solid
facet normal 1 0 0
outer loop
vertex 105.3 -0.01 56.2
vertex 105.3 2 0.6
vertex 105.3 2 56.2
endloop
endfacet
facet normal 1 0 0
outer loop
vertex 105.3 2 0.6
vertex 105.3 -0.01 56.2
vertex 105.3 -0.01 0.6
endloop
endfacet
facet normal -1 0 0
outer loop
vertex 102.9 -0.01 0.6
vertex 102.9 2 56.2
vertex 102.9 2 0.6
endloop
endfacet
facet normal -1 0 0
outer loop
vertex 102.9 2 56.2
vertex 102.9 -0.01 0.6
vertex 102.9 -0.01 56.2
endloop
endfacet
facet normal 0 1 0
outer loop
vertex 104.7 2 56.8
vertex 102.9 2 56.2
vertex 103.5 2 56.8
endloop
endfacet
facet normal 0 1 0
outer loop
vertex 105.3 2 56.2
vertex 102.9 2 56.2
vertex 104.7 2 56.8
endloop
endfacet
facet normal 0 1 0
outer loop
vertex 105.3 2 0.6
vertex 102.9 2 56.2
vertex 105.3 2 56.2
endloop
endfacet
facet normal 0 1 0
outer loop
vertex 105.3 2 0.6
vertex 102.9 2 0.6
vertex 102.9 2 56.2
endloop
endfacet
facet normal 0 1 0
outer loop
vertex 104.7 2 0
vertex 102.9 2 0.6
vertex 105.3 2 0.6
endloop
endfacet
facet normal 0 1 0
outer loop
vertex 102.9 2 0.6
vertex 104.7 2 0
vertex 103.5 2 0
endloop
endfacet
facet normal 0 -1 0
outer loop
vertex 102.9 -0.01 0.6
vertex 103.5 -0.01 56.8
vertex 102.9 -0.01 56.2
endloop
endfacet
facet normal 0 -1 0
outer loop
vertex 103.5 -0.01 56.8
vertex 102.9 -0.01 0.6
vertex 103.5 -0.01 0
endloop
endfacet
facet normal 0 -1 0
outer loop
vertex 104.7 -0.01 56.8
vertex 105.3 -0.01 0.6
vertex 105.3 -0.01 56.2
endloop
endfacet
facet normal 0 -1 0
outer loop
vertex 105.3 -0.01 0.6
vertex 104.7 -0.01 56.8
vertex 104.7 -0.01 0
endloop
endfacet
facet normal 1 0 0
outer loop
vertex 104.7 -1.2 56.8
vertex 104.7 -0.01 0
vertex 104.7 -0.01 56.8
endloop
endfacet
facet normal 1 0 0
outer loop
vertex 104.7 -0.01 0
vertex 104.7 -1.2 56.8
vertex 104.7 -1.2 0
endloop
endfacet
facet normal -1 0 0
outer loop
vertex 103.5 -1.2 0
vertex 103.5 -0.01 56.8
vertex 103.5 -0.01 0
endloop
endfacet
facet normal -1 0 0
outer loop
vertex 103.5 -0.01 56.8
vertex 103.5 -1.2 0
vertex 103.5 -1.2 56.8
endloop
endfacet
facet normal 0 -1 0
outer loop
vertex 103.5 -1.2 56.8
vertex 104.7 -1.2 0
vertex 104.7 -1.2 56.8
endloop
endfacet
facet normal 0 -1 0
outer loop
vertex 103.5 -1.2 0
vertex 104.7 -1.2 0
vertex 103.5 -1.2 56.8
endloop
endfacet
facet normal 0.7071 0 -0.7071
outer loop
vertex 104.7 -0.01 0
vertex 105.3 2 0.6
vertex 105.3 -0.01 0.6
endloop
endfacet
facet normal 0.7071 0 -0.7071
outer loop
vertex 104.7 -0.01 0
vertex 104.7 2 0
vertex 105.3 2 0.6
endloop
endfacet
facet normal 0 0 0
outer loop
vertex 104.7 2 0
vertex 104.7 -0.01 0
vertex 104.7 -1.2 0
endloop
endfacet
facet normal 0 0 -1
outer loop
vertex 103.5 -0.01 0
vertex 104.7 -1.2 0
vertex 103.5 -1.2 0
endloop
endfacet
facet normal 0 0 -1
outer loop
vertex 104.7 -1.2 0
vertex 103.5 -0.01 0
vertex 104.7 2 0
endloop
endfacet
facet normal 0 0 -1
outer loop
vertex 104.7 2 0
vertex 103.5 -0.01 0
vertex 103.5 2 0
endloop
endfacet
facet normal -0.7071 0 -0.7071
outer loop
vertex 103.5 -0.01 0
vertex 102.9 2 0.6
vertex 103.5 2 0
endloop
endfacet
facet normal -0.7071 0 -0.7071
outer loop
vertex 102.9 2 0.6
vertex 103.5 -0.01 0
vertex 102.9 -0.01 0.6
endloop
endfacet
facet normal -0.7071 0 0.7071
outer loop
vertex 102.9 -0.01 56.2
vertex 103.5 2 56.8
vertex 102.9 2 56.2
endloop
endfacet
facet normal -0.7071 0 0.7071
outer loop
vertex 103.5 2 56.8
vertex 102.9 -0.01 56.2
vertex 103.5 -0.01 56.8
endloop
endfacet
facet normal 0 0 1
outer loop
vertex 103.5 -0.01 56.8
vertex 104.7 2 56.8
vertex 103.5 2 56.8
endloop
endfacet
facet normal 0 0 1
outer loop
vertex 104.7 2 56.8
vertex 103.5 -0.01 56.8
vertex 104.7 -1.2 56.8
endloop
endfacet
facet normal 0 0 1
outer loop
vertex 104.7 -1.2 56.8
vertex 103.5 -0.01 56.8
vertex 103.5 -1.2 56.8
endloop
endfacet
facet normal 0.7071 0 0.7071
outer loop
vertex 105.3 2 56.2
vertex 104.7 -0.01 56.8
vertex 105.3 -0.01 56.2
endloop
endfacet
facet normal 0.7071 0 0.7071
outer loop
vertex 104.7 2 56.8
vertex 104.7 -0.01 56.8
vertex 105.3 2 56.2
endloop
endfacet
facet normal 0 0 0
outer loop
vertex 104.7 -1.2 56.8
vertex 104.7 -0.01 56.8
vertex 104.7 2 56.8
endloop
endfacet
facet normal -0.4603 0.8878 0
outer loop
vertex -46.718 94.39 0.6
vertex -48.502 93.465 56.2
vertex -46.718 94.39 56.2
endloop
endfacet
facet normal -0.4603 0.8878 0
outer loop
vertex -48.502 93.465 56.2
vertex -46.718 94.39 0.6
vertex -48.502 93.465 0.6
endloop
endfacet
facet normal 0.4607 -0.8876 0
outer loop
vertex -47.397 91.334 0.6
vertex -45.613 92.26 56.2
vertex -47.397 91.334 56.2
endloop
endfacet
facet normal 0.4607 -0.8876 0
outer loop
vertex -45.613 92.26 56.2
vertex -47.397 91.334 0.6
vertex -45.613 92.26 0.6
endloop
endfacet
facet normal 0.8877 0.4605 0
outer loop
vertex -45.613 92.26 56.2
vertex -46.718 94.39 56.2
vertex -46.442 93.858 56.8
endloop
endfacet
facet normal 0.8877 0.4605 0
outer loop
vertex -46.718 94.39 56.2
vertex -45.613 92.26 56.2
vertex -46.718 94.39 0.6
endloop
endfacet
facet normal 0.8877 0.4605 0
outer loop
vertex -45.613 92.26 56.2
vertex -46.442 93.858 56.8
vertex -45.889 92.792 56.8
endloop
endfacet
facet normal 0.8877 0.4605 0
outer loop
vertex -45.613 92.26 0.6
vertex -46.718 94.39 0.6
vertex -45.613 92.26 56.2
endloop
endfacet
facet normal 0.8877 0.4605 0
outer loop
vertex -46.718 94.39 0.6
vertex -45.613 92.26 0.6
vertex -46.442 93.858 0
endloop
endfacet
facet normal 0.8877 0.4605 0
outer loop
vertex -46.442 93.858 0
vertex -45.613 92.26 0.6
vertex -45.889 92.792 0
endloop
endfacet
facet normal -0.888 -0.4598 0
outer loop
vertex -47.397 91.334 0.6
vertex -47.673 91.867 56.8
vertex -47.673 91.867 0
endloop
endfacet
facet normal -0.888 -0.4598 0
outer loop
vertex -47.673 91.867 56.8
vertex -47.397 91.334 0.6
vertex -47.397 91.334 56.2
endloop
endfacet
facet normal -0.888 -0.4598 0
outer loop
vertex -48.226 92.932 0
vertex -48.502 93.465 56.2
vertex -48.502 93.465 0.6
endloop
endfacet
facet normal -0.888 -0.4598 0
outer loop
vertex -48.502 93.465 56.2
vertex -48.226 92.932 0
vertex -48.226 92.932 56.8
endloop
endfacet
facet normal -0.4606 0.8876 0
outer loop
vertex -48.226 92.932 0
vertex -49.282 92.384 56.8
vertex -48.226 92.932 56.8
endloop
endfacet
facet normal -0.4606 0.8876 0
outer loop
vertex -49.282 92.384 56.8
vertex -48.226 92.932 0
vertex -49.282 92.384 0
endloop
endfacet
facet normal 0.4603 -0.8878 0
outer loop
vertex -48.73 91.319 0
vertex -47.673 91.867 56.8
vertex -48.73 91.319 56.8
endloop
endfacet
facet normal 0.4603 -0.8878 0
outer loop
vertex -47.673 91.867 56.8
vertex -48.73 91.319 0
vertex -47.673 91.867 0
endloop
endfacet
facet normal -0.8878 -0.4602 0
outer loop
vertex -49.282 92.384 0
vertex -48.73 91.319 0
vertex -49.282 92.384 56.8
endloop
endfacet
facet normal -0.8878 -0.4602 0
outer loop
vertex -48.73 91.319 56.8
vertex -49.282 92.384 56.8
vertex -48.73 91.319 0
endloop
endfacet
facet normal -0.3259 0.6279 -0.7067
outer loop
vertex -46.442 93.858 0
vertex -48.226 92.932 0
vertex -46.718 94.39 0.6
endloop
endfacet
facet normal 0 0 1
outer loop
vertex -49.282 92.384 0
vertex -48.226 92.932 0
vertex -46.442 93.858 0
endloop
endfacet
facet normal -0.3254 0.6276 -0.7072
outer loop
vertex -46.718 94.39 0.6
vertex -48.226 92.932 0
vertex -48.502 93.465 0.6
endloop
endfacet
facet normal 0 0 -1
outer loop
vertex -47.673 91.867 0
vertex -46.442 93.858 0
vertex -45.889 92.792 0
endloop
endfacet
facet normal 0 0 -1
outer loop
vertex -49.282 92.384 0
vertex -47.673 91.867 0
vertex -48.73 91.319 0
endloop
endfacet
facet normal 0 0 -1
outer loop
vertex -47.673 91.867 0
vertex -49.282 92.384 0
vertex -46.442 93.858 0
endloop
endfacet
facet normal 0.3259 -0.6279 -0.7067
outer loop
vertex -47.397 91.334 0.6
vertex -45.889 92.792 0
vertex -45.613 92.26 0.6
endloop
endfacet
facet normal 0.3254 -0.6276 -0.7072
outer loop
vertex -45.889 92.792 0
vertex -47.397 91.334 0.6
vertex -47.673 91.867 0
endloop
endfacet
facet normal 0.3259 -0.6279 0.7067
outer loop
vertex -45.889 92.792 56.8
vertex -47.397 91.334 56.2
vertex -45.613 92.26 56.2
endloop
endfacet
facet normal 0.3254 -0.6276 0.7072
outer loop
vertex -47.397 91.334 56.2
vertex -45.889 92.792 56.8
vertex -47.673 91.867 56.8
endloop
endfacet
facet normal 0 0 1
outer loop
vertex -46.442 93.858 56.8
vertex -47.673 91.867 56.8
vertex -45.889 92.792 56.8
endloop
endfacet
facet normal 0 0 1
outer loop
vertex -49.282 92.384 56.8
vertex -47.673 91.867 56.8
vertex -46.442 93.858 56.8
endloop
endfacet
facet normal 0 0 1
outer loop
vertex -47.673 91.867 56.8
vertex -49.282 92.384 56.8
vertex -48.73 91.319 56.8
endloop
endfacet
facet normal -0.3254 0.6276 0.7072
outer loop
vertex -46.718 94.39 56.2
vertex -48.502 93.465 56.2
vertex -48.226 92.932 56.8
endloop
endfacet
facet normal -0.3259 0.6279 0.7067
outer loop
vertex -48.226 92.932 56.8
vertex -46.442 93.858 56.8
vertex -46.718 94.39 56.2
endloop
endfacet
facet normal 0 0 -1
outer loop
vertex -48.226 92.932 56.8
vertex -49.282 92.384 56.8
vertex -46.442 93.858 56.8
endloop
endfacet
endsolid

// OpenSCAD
include <../lib/spool-drybox-lib.scad>;
$fn = 40;
panel_gasket("back");
